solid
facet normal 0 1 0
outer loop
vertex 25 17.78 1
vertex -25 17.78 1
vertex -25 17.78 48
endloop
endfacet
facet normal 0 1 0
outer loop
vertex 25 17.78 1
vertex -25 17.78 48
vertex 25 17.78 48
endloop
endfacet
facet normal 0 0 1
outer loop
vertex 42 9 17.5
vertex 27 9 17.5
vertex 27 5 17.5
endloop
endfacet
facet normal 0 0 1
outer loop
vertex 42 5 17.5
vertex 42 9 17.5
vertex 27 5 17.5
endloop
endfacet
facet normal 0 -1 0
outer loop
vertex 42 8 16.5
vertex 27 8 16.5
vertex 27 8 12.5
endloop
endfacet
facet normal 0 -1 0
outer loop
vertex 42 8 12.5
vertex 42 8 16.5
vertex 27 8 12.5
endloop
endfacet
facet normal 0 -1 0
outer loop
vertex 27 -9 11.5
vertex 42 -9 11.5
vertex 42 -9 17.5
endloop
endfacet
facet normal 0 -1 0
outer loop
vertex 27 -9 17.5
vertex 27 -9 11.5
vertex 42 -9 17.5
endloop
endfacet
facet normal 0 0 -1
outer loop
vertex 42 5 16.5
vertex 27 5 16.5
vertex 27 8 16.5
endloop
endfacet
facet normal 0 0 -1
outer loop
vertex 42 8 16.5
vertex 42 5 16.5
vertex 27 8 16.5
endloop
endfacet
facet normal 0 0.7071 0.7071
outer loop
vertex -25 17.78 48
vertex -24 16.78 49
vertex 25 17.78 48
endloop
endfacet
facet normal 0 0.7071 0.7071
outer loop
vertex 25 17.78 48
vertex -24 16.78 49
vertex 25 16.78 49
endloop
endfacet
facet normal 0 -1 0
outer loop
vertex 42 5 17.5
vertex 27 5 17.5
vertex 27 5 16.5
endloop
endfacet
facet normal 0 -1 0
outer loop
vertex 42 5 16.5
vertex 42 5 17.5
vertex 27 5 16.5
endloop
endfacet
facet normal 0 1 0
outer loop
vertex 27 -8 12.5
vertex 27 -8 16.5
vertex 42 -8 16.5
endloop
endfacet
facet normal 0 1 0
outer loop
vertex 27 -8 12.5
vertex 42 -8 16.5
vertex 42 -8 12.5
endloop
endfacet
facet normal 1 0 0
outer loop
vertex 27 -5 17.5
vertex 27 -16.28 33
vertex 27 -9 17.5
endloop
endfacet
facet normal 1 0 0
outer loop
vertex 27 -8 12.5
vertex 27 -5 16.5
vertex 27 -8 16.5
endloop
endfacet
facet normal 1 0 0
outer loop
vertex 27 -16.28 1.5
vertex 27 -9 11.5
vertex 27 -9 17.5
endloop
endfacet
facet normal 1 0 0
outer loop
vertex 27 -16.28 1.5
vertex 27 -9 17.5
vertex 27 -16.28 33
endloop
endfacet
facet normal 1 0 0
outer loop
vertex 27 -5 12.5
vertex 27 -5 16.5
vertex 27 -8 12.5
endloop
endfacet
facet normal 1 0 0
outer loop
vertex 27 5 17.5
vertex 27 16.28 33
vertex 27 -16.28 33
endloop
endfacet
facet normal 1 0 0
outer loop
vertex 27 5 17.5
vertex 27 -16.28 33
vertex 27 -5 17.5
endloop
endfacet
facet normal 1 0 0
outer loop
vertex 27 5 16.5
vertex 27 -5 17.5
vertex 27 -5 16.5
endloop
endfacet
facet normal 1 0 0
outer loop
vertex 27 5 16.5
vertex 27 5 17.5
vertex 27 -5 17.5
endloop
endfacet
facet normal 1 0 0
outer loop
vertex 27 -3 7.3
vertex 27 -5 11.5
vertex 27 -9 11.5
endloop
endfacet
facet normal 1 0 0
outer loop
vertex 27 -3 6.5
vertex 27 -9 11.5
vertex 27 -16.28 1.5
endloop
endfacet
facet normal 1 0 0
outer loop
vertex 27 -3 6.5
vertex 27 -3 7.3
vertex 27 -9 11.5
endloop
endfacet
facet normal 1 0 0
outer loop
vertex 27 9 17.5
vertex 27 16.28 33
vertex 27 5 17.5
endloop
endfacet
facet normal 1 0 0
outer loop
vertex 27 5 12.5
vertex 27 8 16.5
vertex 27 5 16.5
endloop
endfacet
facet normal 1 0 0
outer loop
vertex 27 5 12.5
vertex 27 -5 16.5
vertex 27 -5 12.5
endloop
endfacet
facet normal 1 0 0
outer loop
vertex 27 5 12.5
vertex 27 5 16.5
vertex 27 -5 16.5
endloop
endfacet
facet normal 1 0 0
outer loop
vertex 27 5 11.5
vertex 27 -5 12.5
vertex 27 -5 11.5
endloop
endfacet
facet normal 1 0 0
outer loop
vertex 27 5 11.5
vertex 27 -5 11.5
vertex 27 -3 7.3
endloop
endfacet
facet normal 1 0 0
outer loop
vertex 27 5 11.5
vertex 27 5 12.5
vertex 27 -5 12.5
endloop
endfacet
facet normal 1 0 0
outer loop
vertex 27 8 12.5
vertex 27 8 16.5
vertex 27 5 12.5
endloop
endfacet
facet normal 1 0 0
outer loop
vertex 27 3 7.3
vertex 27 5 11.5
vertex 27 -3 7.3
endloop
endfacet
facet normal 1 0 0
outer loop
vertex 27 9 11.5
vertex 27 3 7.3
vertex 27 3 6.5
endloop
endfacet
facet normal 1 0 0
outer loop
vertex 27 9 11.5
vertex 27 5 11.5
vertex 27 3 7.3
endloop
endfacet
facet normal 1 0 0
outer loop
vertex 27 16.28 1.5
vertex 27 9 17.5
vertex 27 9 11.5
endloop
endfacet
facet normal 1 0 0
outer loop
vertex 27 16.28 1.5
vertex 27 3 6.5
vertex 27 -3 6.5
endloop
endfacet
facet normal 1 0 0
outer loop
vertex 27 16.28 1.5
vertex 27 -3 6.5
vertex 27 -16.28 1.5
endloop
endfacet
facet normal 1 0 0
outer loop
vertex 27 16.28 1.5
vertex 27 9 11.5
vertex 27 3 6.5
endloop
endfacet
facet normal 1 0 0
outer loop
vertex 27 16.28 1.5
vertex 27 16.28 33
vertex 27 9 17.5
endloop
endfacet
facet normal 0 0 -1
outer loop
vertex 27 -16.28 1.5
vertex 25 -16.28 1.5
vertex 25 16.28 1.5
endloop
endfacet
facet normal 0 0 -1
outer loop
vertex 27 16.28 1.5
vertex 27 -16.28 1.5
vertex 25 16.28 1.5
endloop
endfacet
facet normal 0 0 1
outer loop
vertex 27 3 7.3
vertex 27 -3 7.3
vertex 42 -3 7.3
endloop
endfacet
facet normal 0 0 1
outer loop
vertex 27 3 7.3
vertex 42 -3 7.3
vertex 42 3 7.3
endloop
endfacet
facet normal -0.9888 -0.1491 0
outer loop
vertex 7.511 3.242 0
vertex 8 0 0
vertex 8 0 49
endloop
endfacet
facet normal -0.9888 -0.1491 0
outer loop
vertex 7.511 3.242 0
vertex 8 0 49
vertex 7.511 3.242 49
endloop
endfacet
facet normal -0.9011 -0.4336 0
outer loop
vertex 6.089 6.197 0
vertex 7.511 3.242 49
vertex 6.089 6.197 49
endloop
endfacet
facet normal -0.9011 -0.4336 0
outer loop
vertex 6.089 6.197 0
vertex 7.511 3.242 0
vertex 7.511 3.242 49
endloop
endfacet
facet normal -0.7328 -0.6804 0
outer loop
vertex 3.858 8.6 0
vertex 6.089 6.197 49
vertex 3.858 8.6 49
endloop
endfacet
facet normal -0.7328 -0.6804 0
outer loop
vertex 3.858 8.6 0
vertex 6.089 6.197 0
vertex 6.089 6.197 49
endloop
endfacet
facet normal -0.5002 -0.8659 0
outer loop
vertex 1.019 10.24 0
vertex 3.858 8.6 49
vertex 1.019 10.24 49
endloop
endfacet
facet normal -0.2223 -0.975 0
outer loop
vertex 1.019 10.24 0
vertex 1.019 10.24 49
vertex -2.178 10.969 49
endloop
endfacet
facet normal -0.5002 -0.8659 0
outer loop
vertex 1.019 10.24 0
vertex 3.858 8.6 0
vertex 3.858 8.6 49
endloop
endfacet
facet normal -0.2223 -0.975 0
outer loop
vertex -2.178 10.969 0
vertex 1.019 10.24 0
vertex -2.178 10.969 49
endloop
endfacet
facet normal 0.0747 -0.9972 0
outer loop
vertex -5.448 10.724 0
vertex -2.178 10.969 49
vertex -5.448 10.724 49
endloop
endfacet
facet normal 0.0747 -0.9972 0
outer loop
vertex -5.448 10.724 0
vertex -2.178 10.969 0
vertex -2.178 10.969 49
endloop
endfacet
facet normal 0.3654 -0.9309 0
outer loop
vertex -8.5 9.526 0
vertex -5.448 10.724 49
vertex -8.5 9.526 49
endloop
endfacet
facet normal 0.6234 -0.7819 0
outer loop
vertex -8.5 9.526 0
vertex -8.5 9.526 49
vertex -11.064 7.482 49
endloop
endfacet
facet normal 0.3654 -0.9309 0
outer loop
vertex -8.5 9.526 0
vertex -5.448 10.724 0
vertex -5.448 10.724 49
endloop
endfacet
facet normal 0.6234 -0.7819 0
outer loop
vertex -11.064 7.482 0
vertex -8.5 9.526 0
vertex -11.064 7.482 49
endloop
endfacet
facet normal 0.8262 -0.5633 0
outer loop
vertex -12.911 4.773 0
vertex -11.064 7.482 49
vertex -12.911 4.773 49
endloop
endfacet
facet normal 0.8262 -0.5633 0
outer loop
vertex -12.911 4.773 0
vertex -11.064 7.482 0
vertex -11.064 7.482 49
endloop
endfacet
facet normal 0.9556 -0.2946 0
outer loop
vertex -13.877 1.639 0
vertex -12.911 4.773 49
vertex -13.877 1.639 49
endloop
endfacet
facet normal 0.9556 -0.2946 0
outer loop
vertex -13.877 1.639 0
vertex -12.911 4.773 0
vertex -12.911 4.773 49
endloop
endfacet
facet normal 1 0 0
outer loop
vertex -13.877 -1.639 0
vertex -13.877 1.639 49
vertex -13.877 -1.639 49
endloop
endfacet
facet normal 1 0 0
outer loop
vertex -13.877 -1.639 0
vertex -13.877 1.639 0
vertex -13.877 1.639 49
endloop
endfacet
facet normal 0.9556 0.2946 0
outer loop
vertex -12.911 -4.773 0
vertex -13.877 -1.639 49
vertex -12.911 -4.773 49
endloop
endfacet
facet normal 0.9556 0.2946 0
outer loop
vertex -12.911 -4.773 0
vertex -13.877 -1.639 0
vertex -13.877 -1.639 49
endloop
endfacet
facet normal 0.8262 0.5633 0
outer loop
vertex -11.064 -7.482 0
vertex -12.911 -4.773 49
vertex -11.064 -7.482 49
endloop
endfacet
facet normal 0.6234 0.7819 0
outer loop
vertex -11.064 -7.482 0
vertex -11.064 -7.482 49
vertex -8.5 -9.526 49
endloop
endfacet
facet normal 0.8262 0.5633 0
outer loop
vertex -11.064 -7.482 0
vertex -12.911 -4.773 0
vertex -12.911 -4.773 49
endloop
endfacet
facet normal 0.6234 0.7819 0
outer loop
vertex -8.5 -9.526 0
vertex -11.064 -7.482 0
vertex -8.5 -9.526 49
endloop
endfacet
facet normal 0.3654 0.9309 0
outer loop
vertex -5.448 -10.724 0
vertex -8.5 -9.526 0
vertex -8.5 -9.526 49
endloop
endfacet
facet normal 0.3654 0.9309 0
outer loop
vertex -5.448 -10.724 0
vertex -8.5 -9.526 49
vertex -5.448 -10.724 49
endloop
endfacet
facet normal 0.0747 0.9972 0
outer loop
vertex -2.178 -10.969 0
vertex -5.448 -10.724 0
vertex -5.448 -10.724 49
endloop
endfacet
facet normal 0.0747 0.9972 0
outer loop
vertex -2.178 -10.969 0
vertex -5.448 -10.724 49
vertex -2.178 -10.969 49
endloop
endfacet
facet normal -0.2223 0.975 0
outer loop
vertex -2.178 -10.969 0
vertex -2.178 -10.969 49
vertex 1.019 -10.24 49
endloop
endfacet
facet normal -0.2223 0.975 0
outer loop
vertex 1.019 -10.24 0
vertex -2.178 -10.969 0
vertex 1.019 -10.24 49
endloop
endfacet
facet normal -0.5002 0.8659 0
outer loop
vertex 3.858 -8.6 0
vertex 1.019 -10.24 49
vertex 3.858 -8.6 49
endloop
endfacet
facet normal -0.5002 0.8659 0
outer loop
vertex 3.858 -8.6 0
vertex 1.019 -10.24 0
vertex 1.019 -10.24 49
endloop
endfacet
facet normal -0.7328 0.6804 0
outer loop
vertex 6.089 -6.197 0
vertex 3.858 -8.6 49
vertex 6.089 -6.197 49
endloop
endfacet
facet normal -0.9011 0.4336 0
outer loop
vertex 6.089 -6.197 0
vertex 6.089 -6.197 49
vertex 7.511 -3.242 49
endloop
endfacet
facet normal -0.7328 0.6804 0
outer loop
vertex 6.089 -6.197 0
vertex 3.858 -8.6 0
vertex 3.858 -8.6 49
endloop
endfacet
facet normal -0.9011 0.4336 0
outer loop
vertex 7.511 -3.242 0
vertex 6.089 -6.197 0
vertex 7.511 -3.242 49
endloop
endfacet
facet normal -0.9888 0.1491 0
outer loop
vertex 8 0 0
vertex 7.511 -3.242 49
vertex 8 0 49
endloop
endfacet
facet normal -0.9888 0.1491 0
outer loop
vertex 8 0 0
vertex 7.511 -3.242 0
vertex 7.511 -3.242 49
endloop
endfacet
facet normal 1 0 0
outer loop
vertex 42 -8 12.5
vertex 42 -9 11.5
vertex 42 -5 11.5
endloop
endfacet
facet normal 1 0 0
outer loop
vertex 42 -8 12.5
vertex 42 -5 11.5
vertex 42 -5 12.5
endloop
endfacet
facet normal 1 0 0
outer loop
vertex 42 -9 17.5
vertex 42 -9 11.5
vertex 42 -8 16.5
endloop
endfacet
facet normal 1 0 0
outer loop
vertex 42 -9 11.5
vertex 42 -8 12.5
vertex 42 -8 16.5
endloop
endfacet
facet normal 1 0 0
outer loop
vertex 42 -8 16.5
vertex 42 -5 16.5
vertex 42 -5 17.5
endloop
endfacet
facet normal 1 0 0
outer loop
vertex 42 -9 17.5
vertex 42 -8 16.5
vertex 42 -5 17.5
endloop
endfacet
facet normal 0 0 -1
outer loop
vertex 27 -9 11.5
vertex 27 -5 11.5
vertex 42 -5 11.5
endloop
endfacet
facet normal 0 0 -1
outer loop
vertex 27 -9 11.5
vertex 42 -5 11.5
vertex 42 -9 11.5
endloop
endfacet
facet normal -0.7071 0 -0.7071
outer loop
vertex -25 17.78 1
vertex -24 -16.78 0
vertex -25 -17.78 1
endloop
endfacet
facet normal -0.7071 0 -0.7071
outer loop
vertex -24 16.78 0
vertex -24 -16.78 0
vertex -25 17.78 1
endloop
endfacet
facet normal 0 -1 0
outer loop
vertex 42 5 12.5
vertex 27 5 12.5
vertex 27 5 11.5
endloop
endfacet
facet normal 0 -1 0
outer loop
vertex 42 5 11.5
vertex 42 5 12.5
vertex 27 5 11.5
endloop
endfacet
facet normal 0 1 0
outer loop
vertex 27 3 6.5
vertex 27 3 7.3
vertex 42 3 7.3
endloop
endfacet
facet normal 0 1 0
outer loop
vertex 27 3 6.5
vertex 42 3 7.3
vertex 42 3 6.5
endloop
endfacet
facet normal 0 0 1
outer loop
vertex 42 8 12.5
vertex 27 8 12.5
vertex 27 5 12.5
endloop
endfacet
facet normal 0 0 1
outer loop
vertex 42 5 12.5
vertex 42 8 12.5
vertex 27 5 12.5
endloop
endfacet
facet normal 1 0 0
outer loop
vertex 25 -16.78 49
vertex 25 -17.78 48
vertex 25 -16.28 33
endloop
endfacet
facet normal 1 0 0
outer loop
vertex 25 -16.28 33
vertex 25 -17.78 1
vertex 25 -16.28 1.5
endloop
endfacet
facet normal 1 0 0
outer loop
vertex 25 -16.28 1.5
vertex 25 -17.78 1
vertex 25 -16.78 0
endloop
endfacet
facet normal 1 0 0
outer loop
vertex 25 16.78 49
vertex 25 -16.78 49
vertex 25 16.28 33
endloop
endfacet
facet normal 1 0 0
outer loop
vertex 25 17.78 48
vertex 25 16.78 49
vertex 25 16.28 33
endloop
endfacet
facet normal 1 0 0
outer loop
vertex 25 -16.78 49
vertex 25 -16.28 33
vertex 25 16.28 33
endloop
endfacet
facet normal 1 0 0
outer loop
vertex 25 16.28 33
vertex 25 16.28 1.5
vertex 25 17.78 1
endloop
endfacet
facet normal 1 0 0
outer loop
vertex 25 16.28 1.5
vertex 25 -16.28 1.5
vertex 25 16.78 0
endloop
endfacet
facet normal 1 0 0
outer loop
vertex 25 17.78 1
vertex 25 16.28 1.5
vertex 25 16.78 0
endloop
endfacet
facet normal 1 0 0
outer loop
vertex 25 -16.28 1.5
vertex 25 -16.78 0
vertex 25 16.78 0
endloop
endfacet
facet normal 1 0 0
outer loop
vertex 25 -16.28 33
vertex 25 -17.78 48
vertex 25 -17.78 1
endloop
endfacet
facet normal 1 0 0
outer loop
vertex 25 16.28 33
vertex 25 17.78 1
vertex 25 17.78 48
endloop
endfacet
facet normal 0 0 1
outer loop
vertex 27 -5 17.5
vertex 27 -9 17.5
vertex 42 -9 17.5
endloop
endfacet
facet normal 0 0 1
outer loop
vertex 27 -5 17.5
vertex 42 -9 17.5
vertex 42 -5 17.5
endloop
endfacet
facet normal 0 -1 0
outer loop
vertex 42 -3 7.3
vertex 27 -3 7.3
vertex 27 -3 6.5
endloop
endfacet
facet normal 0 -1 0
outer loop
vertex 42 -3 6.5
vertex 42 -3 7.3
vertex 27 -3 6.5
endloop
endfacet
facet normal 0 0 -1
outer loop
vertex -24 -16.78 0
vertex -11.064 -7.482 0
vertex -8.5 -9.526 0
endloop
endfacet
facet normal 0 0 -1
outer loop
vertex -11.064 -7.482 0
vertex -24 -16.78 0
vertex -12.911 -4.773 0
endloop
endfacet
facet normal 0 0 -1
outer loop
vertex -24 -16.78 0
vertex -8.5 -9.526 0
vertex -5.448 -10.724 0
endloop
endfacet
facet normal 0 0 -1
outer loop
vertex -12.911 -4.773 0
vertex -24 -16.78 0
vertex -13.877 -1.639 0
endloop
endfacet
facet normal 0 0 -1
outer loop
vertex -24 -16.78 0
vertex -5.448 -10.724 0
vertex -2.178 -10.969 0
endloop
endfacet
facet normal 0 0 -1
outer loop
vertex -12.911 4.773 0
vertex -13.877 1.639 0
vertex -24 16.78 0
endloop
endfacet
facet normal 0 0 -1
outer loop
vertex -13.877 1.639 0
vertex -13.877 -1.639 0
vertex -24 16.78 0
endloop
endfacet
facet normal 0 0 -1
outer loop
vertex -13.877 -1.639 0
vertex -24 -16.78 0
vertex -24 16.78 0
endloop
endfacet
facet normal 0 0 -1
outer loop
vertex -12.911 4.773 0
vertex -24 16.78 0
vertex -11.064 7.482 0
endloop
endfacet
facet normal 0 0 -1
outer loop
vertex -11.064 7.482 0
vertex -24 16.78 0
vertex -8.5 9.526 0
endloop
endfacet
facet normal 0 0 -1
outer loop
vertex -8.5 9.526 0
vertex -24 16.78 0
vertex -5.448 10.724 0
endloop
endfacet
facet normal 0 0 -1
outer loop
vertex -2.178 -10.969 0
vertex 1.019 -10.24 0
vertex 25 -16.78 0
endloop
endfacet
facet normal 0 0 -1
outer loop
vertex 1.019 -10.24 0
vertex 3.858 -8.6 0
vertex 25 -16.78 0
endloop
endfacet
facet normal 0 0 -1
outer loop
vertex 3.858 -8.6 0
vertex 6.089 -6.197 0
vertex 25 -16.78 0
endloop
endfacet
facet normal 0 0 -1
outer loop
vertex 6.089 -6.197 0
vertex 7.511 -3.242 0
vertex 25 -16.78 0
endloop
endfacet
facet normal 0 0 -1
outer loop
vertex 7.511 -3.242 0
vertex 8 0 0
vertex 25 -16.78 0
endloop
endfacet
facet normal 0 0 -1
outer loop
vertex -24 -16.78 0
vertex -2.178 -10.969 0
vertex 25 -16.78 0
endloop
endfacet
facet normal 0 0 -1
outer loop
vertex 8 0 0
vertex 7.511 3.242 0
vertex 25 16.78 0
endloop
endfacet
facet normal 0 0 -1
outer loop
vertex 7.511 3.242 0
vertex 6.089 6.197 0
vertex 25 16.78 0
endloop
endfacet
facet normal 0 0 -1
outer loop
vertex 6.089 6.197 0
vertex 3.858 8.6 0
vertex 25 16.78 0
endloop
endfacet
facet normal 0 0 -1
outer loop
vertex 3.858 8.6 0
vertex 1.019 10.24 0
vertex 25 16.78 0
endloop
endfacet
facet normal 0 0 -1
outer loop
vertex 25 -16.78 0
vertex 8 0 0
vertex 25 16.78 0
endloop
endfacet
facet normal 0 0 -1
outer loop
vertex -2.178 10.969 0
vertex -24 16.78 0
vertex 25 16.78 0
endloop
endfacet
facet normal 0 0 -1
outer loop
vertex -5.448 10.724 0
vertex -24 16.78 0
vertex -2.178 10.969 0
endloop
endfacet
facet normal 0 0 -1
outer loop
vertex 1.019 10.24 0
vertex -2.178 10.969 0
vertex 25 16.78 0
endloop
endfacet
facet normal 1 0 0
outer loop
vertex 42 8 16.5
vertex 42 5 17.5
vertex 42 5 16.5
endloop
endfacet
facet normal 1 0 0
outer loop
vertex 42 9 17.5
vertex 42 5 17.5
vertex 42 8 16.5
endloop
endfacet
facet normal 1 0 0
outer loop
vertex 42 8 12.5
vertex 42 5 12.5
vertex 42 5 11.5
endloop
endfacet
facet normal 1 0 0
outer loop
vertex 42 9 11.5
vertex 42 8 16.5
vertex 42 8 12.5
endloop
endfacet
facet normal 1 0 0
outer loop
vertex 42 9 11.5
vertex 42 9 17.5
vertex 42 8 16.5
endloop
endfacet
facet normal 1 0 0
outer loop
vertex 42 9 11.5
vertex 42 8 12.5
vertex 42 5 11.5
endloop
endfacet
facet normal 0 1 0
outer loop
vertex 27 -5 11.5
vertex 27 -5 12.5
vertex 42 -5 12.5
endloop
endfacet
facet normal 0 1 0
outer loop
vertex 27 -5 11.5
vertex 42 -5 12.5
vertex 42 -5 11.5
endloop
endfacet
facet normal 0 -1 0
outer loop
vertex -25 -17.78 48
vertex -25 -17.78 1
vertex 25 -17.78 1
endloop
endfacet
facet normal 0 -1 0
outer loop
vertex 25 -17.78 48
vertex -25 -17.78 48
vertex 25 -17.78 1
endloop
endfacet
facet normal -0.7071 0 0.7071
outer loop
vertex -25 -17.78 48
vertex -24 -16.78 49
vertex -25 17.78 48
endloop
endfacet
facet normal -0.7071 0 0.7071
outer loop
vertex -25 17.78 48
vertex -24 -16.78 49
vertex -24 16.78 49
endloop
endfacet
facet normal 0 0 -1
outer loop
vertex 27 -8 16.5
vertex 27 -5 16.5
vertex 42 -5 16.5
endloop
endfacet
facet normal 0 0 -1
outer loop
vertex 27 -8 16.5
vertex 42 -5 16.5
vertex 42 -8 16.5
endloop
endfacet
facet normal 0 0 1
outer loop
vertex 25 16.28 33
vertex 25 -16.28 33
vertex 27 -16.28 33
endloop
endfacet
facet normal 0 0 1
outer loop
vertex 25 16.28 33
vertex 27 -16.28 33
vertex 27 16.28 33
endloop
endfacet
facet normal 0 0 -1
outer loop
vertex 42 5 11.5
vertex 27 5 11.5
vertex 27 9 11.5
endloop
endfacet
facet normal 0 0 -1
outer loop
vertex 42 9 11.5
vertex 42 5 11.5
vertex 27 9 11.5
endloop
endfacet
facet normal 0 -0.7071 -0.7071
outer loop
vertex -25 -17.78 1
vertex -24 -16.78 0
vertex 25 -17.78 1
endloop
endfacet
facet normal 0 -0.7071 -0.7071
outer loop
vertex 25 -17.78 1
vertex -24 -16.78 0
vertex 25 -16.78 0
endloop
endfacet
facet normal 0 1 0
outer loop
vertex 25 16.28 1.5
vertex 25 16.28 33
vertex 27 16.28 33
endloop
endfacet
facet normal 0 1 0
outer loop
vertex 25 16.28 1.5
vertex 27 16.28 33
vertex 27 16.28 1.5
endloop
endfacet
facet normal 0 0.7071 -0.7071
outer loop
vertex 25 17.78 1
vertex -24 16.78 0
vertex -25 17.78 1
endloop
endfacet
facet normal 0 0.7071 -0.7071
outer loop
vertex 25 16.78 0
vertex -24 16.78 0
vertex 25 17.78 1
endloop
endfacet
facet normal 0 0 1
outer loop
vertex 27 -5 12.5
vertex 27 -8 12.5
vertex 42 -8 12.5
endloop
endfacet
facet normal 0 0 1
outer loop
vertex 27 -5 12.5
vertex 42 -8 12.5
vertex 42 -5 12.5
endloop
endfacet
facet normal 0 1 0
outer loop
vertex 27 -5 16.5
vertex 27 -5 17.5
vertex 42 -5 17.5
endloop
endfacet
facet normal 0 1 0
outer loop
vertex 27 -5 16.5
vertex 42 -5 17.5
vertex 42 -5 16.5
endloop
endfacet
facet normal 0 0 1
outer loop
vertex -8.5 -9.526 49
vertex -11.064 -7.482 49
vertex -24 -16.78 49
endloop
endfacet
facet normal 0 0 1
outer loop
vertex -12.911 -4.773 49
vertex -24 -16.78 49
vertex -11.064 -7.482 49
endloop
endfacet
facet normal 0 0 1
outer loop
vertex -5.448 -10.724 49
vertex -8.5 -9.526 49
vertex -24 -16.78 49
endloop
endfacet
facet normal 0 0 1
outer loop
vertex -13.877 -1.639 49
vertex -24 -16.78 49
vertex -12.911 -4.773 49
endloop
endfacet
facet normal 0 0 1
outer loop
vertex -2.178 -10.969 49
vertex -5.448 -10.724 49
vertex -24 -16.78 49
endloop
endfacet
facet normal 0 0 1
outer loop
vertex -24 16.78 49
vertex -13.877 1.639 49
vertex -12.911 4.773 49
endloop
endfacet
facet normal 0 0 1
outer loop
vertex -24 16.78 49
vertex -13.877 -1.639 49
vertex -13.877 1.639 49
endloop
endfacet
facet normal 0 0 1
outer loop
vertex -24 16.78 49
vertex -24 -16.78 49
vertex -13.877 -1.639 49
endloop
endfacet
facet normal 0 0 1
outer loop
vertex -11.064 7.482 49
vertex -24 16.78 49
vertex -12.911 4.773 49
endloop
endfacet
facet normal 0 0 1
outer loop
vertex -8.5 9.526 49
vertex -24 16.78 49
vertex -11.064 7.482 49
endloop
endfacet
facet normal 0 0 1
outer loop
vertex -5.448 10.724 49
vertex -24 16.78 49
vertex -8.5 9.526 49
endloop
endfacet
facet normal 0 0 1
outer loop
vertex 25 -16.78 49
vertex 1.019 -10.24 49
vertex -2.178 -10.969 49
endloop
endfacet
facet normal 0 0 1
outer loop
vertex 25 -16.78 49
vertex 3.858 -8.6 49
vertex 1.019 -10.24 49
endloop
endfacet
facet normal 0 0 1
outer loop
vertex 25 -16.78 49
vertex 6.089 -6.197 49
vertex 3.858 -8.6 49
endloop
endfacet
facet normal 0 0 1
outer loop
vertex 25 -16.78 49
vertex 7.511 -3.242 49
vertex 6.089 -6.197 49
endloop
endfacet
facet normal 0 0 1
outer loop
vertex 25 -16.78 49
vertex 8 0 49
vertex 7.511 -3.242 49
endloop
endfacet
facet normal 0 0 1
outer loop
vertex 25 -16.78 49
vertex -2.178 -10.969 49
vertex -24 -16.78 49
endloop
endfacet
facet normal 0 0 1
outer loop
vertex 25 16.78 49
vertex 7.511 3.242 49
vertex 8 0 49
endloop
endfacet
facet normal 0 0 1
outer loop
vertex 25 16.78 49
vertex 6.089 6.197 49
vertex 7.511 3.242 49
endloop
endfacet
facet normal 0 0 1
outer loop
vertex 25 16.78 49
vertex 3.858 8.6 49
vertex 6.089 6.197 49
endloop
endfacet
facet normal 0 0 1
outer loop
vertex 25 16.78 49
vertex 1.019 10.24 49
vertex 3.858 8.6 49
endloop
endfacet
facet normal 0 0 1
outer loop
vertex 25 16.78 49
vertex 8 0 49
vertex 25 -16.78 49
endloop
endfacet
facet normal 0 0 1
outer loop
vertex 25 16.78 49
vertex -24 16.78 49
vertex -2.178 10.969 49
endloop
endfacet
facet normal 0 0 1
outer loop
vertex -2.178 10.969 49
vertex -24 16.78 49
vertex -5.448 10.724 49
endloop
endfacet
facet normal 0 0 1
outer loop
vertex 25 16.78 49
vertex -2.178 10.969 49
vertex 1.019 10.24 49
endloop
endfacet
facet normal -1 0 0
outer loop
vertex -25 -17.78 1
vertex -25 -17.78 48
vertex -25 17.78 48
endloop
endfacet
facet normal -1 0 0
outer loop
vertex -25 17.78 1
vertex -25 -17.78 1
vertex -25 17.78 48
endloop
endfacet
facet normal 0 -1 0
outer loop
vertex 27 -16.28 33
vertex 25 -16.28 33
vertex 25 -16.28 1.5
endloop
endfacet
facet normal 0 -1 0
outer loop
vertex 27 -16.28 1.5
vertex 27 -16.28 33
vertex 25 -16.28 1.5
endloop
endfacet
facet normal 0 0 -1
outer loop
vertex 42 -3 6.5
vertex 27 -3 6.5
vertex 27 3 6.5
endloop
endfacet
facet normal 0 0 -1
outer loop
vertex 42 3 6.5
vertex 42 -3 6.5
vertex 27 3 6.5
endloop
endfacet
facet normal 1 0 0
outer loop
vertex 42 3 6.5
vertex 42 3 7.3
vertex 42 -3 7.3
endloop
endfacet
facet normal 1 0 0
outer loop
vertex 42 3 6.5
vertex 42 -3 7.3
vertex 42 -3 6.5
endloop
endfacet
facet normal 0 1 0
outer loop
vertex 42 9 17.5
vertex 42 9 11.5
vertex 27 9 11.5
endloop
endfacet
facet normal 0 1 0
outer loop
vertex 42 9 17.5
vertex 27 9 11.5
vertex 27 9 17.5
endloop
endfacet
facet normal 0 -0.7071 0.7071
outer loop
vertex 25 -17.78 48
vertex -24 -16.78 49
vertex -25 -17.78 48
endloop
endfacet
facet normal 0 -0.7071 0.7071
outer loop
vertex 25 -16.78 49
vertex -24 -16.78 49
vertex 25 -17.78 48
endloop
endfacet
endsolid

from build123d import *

# Parameters (mm, degrees)
SKETCH1_W           = 50
SKETCH1_H           = 35.56
SKETCH1_R           = 11
BOSS_EXTRUDE1_DEPTH = 49
SKETCH2_W           = 31.5
SKETCH2_H           = 32.56
BOSS_EXTRUDE2_DEPTH = 2
SKETCH3_W           = 0.8
SKETCH3_H           = 6
BOSS_EXTRUDE3_DEPTH = 15
CHAMFER1_SIZE       = 1


with BuildPart() as part:
    # Sketch1 → Boss-Extrude1 (new body)
    with BuildSketch(Plane.XY):
        Rectangle(SKETCH1_W, SKETCH1_H)
        with Locations((-3, 0)):
            Circle(SKETCH1_R, mode=Mode.SUBTRACT)
    extrude(amount=BOSS_EXTRUDE1_DEPTH)

    # Sketch2 → Boss-Extrude2 (add)
    with BuildSketch(Plane(origin=(25, 0, 0), x_dir=(0, 0, -1), z_dir=(1, 0, 0))):
        with Locations((-17.25, 0)):
            Rectangle(SKETCH2_W, SKETCH2_H)
    extrude(amount=BOSS_EXTRUDE2_DEPTH)

    # Sketch3 → Boss-Extrude3 (add)
    with BuildSketch(Plane(origin=(27, 0, 0), x_dir=(0, 0, -1), z_dir=(1, 0, 0))):
        Polygon((-16.5, 5), (-16.5, 8), (-12.5, 8), (-12.5, 5), (-11.5, 5), (-11.5, 9), (-17.5, 9), (-17.5, 5), align=None)
        with Locations((-6.9, 0)):
            Rectangle(SKETCH3_W, SKETCH3_H)
        Polygon((-12.5, -5), (-11.5, -5), (-11.5, -9), (-17.5, -9), (-17.5, -5), (-16.5, -5), (-16.5, -8), (-12.5, -8), align=None)
    extrude(amount=BOSS_EXTRUDE3_DEPTH)

    # Chamfer1
    chamfer1_edges = [part.edges().sort_by_distance(p)[0] for p in [
        (0, 17.78, 49),
        (-25, 0, 49),
        (0, 17.78, 0),
        (0, -17.78, 0),
        (-25, 0, 0),
        (0, -17.78, 49),
    ]]
    chamfer(chamfer1_edges, length=CHAMFER1_SIZE)


solid = part.part
